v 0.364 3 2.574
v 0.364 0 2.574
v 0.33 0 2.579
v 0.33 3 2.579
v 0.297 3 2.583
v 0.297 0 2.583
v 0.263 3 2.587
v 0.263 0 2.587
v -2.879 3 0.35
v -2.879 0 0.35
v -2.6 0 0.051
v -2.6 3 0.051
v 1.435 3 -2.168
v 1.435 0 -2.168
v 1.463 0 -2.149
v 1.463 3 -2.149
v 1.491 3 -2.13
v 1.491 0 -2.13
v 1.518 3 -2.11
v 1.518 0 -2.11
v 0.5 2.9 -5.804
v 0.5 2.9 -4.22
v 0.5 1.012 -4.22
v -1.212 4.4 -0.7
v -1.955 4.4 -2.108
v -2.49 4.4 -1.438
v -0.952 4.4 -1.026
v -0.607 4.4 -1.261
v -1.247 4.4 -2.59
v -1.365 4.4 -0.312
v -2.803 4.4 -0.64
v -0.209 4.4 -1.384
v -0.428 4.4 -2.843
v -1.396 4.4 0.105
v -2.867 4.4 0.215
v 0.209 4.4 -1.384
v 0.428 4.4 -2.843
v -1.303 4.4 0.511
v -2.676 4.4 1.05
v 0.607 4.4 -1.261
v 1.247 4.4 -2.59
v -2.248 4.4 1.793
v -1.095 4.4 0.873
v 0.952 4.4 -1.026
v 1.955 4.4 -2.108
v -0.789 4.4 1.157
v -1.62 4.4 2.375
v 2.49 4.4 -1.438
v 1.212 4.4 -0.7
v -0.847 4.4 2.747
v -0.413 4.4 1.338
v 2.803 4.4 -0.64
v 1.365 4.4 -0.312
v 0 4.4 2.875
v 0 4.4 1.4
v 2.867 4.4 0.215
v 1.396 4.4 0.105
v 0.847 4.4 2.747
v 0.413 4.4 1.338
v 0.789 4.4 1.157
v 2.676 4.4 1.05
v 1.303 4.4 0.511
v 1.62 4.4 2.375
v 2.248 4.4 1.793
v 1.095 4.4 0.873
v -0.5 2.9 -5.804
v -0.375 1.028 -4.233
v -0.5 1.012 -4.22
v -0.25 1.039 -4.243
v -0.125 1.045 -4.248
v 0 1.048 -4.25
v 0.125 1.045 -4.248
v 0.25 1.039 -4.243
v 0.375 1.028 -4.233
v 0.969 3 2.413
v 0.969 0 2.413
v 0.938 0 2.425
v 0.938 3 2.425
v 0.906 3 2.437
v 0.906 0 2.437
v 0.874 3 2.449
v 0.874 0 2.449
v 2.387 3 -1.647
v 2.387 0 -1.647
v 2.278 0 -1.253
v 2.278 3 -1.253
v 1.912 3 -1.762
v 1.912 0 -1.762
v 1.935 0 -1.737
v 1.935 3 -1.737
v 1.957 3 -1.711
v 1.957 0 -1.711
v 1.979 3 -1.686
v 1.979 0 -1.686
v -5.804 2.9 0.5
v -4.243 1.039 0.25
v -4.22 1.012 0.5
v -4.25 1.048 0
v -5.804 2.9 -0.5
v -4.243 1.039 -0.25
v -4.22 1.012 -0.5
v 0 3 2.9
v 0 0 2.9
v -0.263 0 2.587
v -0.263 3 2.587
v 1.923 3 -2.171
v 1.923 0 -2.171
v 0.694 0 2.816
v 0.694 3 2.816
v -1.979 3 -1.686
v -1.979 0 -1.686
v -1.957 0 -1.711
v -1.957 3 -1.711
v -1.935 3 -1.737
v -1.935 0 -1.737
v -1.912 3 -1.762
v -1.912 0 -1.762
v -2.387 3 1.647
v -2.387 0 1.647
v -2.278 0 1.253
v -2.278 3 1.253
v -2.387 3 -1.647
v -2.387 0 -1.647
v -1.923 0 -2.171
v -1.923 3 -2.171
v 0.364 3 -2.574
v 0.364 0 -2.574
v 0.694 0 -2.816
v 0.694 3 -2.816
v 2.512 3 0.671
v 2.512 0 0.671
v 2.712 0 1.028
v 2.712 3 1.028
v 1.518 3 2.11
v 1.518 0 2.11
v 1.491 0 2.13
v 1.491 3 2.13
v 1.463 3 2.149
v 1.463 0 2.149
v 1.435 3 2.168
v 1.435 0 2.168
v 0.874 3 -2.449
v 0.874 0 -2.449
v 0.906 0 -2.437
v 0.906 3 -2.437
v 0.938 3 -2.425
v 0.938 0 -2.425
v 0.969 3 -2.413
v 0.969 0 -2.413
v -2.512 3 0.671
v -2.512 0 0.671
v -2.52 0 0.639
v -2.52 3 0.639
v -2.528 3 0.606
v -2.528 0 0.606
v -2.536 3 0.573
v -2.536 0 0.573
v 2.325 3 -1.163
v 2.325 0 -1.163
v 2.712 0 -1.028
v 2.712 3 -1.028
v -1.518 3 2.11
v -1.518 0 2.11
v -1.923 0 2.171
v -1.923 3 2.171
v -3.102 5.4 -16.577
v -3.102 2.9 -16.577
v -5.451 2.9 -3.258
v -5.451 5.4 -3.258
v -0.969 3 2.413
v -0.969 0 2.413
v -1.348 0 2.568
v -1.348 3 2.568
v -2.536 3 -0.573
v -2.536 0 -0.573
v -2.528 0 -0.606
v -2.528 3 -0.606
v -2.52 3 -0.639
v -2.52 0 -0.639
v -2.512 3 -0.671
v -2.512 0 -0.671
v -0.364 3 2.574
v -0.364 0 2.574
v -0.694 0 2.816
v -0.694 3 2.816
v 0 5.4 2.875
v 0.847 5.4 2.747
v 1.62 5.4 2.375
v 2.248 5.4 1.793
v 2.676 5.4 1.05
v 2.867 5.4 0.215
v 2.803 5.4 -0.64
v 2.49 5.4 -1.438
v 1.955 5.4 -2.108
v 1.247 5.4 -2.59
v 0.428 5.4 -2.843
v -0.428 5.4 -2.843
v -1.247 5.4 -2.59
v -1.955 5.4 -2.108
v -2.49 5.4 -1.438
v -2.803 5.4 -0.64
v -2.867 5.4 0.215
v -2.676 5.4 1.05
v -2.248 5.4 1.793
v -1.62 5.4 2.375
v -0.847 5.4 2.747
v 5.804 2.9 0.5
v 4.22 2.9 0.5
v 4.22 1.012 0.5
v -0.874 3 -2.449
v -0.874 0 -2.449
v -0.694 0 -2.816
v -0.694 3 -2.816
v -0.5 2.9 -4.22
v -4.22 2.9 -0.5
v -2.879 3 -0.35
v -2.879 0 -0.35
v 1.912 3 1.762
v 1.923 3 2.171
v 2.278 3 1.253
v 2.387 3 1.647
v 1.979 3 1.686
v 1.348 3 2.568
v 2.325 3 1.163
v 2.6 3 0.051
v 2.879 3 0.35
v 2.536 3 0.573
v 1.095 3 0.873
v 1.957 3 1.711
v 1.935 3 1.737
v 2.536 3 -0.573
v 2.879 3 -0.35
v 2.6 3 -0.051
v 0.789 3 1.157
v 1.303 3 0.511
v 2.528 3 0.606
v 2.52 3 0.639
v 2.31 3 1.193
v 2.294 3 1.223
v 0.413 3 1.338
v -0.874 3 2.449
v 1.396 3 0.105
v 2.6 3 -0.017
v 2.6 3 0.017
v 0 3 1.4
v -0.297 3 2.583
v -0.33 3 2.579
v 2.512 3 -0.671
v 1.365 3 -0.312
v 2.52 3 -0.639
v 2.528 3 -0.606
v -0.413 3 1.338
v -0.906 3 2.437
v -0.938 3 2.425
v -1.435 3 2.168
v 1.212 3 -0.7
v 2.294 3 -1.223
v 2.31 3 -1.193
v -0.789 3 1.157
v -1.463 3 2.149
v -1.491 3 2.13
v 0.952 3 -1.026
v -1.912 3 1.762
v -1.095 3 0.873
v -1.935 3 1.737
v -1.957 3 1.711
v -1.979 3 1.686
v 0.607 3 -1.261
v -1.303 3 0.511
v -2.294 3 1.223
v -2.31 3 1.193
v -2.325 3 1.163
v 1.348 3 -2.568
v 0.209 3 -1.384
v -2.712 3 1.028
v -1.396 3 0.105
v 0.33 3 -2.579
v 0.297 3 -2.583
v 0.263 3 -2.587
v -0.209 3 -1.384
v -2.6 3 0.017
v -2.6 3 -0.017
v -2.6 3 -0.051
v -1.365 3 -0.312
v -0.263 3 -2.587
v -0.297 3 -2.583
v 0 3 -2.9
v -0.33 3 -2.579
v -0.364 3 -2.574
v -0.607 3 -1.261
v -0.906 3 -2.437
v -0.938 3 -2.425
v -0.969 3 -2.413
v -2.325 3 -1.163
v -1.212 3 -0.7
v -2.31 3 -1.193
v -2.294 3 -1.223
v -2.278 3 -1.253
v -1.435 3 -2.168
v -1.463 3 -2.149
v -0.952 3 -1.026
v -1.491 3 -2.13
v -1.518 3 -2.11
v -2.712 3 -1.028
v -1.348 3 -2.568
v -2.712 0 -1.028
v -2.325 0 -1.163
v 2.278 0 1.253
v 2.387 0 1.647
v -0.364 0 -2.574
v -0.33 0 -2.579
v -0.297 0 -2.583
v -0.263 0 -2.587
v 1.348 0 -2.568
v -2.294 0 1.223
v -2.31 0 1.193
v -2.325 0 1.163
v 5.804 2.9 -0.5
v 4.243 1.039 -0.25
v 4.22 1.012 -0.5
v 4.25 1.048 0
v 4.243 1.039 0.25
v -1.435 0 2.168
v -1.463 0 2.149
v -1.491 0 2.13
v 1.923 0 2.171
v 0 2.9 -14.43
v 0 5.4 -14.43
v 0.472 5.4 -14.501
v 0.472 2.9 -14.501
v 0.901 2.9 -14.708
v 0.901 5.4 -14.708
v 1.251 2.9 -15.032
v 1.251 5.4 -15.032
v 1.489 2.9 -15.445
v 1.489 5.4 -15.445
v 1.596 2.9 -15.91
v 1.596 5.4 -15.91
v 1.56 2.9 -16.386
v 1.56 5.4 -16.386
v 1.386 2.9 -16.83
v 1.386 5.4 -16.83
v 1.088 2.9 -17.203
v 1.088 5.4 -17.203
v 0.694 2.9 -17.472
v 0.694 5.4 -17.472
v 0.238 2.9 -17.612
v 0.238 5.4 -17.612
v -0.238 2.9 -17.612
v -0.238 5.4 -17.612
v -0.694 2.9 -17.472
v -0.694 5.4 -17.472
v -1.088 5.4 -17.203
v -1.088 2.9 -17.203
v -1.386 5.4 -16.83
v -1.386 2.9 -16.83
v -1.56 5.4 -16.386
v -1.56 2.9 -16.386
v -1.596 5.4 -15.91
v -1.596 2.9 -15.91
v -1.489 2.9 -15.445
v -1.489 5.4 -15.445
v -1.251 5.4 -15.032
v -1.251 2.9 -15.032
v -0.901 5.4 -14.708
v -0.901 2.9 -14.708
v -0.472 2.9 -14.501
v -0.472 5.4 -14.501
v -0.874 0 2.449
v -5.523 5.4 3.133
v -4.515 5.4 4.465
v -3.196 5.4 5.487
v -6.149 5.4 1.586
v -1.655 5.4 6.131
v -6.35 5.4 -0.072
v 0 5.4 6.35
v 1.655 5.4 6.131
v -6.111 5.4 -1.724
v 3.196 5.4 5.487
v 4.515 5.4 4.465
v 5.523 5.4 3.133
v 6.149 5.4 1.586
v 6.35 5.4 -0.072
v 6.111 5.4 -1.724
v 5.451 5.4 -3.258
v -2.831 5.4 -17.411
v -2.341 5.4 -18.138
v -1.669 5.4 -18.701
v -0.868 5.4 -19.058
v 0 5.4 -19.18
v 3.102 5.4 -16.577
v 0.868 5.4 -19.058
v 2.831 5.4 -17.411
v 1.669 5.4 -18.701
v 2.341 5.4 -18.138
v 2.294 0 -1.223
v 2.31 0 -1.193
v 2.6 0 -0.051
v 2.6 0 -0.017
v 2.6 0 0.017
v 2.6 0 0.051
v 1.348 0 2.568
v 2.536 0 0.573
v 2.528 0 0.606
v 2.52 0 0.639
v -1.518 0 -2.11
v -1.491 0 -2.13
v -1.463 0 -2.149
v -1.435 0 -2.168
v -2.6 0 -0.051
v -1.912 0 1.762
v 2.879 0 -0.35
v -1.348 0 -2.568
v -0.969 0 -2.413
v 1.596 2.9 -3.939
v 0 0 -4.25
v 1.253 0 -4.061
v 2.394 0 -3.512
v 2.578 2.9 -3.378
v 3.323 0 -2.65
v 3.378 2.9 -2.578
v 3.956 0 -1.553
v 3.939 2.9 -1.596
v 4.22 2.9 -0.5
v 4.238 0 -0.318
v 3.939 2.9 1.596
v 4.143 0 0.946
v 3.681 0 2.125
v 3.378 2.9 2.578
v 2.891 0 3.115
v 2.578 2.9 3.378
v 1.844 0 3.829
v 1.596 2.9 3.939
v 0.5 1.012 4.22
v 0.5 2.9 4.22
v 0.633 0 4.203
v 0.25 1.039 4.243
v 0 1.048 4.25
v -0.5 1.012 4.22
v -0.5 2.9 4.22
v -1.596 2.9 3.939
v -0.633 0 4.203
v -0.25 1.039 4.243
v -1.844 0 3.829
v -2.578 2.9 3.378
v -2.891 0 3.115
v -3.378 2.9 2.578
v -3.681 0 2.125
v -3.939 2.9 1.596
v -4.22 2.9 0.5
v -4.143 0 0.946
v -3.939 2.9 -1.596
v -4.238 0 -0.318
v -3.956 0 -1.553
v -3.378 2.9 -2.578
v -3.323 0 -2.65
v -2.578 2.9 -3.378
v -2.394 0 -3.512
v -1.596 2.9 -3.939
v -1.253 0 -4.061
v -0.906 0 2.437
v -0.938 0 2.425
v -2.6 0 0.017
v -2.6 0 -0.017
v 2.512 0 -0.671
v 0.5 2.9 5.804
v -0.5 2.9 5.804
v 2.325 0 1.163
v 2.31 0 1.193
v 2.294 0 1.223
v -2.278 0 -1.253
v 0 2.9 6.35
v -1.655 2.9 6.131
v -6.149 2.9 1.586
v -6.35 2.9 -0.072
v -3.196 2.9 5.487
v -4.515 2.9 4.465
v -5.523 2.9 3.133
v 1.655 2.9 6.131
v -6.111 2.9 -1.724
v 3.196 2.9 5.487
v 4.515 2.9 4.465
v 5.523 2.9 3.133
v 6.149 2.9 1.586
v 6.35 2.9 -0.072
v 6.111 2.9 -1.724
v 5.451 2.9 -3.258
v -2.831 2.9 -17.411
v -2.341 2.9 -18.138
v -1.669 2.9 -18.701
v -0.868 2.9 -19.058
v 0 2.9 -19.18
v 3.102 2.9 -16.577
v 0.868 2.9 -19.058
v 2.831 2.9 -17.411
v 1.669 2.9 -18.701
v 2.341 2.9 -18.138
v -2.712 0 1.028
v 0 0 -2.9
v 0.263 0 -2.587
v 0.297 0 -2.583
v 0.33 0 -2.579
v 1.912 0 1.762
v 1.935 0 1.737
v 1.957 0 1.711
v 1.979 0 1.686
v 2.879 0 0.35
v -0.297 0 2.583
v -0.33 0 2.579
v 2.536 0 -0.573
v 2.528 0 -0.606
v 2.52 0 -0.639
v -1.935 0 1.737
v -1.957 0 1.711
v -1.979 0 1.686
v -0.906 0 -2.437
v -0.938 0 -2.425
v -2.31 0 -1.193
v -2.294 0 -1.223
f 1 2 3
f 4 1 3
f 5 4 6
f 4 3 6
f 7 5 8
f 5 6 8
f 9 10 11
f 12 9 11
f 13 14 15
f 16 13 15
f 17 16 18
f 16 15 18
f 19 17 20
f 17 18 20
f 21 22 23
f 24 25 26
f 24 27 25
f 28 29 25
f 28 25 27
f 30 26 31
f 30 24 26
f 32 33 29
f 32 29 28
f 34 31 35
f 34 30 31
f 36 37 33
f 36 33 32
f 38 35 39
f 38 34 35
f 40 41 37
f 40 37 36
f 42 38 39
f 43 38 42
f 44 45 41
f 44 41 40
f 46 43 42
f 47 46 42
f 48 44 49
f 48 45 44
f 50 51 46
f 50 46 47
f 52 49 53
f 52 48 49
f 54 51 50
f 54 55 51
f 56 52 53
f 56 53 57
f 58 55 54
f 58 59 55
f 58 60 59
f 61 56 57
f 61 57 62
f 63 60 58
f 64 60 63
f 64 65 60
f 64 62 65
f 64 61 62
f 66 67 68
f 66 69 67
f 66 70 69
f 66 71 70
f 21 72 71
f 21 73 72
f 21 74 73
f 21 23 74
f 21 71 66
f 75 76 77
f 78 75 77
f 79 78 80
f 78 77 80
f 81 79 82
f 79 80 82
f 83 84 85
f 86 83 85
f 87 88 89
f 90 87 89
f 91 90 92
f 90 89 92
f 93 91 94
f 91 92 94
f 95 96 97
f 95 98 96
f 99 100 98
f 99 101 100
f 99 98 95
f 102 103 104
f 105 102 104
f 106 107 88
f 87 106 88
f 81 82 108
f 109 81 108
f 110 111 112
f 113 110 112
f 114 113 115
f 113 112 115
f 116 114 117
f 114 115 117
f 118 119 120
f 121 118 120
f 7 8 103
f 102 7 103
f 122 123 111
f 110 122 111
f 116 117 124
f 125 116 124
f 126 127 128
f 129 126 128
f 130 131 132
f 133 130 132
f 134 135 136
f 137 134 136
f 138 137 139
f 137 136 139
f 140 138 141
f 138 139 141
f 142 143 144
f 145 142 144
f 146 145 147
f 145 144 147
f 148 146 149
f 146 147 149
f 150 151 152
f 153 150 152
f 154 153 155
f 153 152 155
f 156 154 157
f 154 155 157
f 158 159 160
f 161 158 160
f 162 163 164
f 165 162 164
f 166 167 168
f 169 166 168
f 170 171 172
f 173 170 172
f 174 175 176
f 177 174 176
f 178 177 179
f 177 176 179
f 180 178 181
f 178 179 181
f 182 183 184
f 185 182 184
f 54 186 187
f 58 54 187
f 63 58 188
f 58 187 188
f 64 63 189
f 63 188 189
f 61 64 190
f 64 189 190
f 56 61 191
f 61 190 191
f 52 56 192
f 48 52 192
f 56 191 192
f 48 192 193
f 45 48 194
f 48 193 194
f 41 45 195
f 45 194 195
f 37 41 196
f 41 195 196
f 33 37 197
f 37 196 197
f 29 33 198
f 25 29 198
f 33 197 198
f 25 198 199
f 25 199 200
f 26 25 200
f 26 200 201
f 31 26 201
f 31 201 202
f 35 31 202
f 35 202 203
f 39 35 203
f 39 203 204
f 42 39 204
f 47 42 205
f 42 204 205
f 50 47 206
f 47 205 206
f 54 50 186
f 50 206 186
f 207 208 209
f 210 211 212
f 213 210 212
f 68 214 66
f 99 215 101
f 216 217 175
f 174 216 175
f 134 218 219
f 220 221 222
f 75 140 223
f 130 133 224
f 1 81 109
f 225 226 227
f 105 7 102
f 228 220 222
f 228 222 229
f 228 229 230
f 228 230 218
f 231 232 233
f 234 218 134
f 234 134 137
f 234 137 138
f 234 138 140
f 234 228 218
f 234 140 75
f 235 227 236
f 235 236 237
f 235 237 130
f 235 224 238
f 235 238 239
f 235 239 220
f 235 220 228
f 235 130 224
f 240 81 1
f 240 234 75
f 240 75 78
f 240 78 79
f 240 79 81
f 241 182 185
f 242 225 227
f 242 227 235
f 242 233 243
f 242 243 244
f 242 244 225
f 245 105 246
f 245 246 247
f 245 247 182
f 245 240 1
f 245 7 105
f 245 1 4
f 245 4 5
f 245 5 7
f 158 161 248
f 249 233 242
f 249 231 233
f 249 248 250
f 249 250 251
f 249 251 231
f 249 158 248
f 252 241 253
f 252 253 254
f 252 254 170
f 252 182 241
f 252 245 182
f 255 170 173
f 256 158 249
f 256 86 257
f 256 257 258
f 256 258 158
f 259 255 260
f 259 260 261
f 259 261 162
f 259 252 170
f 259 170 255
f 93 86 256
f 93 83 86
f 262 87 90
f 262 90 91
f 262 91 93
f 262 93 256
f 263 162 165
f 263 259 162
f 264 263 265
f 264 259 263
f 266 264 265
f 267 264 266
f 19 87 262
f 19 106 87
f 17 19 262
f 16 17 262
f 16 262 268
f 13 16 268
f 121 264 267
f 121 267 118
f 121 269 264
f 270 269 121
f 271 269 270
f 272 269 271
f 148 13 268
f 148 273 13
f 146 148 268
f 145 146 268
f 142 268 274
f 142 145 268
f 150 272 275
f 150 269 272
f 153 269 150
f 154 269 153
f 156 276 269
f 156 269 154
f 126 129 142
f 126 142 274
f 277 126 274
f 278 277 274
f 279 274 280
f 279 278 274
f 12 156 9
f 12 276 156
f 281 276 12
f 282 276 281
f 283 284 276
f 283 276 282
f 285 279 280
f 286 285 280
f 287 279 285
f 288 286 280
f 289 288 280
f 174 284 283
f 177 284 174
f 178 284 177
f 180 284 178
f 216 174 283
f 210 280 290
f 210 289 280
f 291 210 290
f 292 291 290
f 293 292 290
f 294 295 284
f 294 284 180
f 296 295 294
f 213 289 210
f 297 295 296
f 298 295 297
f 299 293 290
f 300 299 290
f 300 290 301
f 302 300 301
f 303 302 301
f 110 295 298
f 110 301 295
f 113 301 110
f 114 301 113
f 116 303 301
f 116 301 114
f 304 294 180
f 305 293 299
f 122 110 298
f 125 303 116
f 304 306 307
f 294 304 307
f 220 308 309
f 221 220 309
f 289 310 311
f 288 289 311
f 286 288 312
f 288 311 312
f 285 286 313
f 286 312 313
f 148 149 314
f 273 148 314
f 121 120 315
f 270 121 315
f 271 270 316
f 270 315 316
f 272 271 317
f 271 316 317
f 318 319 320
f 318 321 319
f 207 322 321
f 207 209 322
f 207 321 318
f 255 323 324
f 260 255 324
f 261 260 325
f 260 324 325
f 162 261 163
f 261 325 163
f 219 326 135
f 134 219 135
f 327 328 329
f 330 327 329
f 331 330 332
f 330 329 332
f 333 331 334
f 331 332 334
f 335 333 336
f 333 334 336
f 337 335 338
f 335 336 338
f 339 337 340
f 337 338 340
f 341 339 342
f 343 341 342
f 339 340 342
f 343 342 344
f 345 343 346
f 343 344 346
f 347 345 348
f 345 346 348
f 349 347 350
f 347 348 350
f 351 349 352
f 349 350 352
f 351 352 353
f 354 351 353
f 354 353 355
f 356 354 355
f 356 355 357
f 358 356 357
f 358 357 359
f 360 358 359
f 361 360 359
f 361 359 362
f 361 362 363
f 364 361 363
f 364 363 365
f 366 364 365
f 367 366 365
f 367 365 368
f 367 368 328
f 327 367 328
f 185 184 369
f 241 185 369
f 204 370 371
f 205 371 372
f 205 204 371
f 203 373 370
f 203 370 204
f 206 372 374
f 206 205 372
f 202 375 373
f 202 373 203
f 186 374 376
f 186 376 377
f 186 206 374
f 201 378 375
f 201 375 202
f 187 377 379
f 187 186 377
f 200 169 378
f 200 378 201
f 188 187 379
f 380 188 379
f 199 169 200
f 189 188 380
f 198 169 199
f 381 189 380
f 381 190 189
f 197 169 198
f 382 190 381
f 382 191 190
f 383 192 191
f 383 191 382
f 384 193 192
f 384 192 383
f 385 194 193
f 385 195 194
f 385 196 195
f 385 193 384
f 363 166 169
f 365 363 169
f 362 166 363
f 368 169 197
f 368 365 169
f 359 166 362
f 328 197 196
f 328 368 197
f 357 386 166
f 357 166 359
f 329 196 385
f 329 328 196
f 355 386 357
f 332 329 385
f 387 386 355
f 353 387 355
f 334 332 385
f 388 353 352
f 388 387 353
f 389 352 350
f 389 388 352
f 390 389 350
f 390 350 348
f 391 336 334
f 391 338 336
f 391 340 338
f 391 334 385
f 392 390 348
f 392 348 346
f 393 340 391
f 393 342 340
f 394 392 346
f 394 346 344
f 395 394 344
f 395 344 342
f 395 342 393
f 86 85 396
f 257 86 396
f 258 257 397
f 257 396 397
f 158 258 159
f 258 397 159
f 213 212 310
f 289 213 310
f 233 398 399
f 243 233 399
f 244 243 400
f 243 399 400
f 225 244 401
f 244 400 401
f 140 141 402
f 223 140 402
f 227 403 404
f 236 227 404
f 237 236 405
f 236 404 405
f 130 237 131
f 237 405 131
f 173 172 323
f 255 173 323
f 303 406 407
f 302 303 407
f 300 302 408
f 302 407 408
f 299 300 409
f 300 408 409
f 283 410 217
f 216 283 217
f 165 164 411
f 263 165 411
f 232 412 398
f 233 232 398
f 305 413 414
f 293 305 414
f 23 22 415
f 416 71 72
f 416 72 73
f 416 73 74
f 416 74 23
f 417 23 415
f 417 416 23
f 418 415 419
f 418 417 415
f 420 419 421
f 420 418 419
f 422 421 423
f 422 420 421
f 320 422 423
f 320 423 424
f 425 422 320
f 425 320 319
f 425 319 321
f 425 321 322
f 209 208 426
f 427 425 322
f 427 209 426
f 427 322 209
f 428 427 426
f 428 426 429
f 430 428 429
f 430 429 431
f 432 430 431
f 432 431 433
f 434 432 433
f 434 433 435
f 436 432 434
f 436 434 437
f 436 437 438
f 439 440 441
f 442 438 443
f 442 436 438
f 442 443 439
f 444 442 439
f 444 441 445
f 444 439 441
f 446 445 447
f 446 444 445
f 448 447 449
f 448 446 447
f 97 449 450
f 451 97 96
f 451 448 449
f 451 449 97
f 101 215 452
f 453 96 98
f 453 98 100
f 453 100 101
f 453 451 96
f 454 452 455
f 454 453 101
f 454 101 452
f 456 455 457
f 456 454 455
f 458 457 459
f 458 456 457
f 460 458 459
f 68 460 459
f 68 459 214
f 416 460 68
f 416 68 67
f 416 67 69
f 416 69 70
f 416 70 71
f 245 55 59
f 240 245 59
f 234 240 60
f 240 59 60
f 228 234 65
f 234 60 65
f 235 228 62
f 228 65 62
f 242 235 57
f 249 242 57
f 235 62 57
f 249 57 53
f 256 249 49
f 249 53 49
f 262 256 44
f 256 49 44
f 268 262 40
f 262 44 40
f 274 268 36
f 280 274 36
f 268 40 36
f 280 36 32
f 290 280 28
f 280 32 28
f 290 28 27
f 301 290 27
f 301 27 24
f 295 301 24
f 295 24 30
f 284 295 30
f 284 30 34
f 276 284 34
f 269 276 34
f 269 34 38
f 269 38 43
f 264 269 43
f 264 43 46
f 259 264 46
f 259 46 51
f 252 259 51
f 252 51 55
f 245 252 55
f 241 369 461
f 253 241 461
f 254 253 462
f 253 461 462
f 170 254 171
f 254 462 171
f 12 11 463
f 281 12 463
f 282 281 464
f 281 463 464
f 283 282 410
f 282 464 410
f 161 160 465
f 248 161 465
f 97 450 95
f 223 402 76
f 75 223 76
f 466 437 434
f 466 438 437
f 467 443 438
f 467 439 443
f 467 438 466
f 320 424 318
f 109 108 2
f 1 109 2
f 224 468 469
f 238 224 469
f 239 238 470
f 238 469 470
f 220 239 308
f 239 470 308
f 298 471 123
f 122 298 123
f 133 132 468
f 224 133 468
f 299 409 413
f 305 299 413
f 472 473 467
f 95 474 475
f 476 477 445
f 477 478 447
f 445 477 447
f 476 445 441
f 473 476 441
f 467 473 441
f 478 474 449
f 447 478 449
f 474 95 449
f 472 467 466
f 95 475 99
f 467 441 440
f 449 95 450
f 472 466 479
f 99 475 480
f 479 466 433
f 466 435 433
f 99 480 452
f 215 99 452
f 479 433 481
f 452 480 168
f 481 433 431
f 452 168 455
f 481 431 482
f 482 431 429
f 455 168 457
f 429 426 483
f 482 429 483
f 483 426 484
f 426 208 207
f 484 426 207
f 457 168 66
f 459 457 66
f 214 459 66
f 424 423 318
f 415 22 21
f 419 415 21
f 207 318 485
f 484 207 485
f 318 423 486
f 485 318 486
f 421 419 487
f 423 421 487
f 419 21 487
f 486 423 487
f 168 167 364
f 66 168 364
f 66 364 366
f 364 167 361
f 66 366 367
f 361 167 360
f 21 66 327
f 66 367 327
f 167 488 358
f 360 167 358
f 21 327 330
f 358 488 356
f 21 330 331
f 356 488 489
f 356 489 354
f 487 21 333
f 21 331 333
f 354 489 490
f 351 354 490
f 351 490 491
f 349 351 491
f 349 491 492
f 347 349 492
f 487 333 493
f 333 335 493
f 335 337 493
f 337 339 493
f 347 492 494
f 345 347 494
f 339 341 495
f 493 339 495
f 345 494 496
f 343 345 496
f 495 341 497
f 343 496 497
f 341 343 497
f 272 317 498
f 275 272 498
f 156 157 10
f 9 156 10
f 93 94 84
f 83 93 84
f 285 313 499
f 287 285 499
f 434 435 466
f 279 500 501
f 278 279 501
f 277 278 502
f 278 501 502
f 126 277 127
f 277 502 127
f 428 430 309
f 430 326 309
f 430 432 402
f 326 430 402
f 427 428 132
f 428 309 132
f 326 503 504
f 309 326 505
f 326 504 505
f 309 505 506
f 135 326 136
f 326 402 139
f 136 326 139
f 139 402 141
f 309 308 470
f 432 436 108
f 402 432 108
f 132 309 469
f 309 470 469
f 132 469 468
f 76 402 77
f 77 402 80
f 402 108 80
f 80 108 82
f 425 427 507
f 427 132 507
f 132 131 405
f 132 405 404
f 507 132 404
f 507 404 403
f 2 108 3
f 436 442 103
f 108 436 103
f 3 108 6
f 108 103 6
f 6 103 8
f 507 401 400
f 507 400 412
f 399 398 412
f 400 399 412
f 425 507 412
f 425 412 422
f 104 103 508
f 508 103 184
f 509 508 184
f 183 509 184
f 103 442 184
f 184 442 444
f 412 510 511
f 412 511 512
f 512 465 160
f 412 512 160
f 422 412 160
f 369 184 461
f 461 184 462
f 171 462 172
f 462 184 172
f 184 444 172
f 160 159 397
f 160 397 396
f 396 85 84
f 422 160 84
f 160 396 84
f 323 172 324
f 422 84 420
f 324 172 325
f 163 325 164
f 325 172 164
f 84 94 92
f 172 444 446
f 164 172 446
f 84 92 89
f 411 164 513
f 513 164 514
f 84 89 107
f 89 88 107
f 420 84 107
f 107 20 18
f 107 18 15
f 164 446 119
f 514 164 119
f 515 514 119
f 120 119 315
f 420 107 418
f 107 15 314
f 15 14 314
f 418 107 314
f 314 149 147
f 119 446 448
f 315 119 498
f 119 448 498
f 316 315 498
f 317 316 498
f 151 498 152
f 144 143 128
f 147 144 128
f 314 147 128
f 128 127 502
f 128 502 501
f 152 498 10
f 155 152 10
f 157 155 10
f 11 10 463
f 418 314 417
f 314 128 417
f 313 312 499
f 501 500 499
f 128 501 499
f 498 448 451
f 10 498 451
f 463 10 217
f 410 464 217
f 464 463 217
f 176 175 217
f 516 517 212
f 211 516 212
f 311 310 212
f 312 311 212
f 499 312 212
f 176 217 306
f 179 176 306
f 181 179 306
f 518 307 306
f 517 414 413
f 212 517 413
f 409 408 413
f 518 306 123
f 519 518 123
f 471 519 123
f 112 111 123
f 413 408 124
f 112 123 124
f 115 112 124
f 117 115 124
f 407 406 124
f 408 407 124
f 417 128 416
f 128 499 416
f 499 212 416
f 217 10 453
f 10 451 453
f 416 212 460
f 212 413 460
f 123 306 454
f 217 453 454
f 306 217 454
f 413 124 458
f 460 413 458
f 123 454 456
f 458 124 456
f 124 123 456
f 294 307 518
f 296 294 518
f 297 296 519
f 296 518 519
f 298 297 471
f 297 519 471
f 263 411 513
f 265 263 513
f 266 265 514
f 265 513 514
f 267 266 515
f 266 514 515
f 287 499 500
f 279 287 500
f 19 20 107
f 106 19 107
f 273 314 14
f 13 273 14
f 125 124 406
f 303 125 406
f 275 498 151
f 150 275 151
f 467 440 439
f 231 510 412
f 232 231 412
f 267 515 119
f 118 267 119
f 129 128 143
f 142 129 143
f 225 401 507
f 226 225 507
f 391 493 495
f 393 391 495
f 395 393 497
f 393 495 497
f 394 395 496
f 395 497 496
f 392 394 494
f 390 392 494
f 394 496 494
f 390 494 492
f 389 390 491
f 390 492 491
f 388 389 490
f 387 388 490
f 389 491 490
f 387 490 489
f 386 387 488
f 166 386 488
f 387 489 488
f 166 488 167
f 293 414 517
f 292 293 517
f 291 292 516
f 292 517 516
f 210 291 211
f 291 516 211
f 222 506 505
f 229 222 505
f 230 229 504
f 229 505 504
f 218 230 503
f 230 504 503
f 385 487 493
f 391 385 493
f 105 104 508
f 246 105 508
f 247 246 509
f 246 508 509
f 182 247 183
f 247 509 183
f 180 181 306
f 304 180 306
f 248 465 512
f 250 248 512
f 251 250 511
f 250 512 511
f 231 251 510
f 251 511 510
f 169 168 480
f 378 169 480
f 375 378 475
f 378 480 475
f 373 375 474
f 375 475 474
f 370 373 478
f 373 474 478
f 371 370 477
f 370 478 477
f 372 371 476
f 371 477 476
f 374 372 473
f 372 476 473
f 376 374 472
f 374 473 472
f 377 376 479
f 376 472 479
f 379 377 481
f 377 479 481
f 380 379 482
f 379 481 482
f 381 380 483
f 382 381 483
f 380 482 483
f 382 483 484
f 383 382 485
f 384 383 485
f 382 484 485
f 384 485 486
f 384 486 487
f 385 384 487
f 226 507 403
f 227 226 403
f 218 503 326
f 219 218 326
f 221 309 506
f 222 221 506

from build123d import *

# Parameters (mm, degrees)
BASES_R             = 6.35
BASE_DEPTH          = 5.4
TOPBORES_R          = 1.4
TOP_BORE_DEPTH      = 11.478788098
HORN_START          = -2.5
HORN_HALF_DEPTH     = 2.5
HORNATTACHS_R       = 1.6
HORN_ATTACH_DEPTH   = 21.913031822
TOOTH_DEPTH         = 3
TOOTH_CP_COUNT      = 26
BOTTOMBORES_R       = 2.6
BOTTOM_BORE_DEPTH   = 3
HOLDINGSHAFTS_R     = 6.35
HOLDINGSHAFTS_R_2   = 4.25
HOLDING_SHAFT_DEPTH = 2.9
RIB_DEPTH           = 0.5
RIB_CP_COUNT        = 4
SKETCH1_R           = 2.875
CUT_EXTRUDE1_DEPTH  = 1


with BuildPart() as part:
    # BaseS → BASE (new body)
    with BuildSketch(Plane(origin=(0, 0, 0), x_dir=(1, 0, 0), z_dir=(0, 1, 0))):
        with Locations(Location((0, 0, 0), (0, 0, 90))):
            Circle(BASES_R)
    extrude(amount=BASE_DEPTH)

    # TopBoreS → TOP BORE (cut, through all)
    with BuildSketch(Plane(origin=(0, 5.4, 0), x_dir=(1, 0, 0), z_dir=(0, 1, 0))):
        with Locations(Location((0, 0, 0), (0, 0, 270))):
            Circle(TOPBORES_R)
    extrude(amount=-TOP_BORE_DEPTH, mode=Mode.SUBTRACT)

    # HornHalfS → HORN HALF (add)
    with BuildSketch(Plane(origin=(0, 5.4, 0), x_dir=(1, 0, 0), z_dir=(0, 1, 0)).offset(HORN_START)):
        with BuildLine():
            Line((-3.102144422, 16.57699176), (-5.450702003, 3.257659846))
            ThreePointArc((-5.450702003, 3.257659846), (0, 6.35), (5.450702003, 3.257659846))
            Line((5.450702003, 3.257659846), (3.102144422, 16.57699176))
            ThreePointArc((3.102144422, 16.57699176), (0, 19.18), (-3.102144422, 16.57699176))
        make_face()
    extrude(amount=HORN_HALF_DEPTH)

    # HornAttachS → HORN ATTACH (cut, through all)
    with BuildSketch(Plane(origin=(0, 5.4, 0), x_dir=(1, 0, 0), z_dir=(0, 1, 0))):
        with Locations(Location((0, 16.03, 0), (0, 0, 270))):
            Circle(HORNATTACHS_R)
    extrude(amount=-HORN_ATTACH_DEPTH, mode=Mode.SUBTRACT)

    # ToothS → TOOTH (cut)
    with BuildSketch(Plane.XZ):
        with BuildLine():
            Line((0, -2.9), (0.262912611, -2.586672952))
            ThreePointArc((0.262912611, -2.586672952), (0, -2.6), (-0.262912611, -2.586672952))
            Line((-0.262912611, -2.586672952), (0, -2.9))
        make_face()
    tooth = extrude(amount=-TOOTH_DEPTH, mode=Mode.SUBTRACT)

    # TOOTH CP: TOOTH ×26 about axis
    tooth_cp_axis = Axis((0, 0, 0), (0, 1, 0))
    for i in range(1, TOOTH_CP_COUNT):
        add(tooth.rotate(tooth_cp_axis, i * 360 / TOOTH_CP_COUNT), mode=Mode.SUBTRACT)

    # BottomBoreS → BOTTOM BORE (cut)
    with BuildSketch(Plane(origin=(0, 0, 0), x_dir=(-1, 0, 0), z_dir=(0, -1, 0))):
        Circle(BOTTOMBORES_R)
    extrude(amount=-BOTTOM_BORE_DEPTH, mode=Mode.SUBTRACT)

    # HoldingShaftS → HOLDING SHAFT (cut)
    with BuildSketch(Plane.XZ):
        Circle(HOLDINGSHAFTS_R)
        with Locations(Location((0, 0, 0), (0, 0, 270))):
            Circle(HOLDINGSHAFTS_R_2, mode=Mode.SUBTRACT)
    extrude(amount=-HOLDING_SHAFT_DEPTH, mode=Mode.SUBTRACT)

    # RibS → RIB (add, symmetric)
    with BuildSketch(Plane.XY):
        Polygon((4.21, 1), (5.804289299, 2.9), (4.21, 2.9), (4.16, 2.9), (4.16, 1), align=None)
    rib = extrude(amount=RIB_DEPTH, both=True)

    # RIB CP: RIB ×4 about axis
    rib_cp_axis = Axis((0, 0, 0), (0, 1, 0))
    for i in range(1, RIB_CP_COUNT):
        add(rib.rotate(rib_cp_axis, i * 360 / RIB_CP_COUNT))

    # Sketch1 → Cut-Extrude1 (cut)
    with BuildSketch(Plane(origin=(0, 5.4, 0), x_dir=(1, 0, 0), z_dir=(0, 1, 0))):
        with Locations(Location((0, 0, 0), (0, 0, 270))):
            Circle(SKETCH1_R)
    extrude(amount=-CUT_EXTRUDE1_DEPTH, mode=Mode.SUBTRACT)


solid = part.part
